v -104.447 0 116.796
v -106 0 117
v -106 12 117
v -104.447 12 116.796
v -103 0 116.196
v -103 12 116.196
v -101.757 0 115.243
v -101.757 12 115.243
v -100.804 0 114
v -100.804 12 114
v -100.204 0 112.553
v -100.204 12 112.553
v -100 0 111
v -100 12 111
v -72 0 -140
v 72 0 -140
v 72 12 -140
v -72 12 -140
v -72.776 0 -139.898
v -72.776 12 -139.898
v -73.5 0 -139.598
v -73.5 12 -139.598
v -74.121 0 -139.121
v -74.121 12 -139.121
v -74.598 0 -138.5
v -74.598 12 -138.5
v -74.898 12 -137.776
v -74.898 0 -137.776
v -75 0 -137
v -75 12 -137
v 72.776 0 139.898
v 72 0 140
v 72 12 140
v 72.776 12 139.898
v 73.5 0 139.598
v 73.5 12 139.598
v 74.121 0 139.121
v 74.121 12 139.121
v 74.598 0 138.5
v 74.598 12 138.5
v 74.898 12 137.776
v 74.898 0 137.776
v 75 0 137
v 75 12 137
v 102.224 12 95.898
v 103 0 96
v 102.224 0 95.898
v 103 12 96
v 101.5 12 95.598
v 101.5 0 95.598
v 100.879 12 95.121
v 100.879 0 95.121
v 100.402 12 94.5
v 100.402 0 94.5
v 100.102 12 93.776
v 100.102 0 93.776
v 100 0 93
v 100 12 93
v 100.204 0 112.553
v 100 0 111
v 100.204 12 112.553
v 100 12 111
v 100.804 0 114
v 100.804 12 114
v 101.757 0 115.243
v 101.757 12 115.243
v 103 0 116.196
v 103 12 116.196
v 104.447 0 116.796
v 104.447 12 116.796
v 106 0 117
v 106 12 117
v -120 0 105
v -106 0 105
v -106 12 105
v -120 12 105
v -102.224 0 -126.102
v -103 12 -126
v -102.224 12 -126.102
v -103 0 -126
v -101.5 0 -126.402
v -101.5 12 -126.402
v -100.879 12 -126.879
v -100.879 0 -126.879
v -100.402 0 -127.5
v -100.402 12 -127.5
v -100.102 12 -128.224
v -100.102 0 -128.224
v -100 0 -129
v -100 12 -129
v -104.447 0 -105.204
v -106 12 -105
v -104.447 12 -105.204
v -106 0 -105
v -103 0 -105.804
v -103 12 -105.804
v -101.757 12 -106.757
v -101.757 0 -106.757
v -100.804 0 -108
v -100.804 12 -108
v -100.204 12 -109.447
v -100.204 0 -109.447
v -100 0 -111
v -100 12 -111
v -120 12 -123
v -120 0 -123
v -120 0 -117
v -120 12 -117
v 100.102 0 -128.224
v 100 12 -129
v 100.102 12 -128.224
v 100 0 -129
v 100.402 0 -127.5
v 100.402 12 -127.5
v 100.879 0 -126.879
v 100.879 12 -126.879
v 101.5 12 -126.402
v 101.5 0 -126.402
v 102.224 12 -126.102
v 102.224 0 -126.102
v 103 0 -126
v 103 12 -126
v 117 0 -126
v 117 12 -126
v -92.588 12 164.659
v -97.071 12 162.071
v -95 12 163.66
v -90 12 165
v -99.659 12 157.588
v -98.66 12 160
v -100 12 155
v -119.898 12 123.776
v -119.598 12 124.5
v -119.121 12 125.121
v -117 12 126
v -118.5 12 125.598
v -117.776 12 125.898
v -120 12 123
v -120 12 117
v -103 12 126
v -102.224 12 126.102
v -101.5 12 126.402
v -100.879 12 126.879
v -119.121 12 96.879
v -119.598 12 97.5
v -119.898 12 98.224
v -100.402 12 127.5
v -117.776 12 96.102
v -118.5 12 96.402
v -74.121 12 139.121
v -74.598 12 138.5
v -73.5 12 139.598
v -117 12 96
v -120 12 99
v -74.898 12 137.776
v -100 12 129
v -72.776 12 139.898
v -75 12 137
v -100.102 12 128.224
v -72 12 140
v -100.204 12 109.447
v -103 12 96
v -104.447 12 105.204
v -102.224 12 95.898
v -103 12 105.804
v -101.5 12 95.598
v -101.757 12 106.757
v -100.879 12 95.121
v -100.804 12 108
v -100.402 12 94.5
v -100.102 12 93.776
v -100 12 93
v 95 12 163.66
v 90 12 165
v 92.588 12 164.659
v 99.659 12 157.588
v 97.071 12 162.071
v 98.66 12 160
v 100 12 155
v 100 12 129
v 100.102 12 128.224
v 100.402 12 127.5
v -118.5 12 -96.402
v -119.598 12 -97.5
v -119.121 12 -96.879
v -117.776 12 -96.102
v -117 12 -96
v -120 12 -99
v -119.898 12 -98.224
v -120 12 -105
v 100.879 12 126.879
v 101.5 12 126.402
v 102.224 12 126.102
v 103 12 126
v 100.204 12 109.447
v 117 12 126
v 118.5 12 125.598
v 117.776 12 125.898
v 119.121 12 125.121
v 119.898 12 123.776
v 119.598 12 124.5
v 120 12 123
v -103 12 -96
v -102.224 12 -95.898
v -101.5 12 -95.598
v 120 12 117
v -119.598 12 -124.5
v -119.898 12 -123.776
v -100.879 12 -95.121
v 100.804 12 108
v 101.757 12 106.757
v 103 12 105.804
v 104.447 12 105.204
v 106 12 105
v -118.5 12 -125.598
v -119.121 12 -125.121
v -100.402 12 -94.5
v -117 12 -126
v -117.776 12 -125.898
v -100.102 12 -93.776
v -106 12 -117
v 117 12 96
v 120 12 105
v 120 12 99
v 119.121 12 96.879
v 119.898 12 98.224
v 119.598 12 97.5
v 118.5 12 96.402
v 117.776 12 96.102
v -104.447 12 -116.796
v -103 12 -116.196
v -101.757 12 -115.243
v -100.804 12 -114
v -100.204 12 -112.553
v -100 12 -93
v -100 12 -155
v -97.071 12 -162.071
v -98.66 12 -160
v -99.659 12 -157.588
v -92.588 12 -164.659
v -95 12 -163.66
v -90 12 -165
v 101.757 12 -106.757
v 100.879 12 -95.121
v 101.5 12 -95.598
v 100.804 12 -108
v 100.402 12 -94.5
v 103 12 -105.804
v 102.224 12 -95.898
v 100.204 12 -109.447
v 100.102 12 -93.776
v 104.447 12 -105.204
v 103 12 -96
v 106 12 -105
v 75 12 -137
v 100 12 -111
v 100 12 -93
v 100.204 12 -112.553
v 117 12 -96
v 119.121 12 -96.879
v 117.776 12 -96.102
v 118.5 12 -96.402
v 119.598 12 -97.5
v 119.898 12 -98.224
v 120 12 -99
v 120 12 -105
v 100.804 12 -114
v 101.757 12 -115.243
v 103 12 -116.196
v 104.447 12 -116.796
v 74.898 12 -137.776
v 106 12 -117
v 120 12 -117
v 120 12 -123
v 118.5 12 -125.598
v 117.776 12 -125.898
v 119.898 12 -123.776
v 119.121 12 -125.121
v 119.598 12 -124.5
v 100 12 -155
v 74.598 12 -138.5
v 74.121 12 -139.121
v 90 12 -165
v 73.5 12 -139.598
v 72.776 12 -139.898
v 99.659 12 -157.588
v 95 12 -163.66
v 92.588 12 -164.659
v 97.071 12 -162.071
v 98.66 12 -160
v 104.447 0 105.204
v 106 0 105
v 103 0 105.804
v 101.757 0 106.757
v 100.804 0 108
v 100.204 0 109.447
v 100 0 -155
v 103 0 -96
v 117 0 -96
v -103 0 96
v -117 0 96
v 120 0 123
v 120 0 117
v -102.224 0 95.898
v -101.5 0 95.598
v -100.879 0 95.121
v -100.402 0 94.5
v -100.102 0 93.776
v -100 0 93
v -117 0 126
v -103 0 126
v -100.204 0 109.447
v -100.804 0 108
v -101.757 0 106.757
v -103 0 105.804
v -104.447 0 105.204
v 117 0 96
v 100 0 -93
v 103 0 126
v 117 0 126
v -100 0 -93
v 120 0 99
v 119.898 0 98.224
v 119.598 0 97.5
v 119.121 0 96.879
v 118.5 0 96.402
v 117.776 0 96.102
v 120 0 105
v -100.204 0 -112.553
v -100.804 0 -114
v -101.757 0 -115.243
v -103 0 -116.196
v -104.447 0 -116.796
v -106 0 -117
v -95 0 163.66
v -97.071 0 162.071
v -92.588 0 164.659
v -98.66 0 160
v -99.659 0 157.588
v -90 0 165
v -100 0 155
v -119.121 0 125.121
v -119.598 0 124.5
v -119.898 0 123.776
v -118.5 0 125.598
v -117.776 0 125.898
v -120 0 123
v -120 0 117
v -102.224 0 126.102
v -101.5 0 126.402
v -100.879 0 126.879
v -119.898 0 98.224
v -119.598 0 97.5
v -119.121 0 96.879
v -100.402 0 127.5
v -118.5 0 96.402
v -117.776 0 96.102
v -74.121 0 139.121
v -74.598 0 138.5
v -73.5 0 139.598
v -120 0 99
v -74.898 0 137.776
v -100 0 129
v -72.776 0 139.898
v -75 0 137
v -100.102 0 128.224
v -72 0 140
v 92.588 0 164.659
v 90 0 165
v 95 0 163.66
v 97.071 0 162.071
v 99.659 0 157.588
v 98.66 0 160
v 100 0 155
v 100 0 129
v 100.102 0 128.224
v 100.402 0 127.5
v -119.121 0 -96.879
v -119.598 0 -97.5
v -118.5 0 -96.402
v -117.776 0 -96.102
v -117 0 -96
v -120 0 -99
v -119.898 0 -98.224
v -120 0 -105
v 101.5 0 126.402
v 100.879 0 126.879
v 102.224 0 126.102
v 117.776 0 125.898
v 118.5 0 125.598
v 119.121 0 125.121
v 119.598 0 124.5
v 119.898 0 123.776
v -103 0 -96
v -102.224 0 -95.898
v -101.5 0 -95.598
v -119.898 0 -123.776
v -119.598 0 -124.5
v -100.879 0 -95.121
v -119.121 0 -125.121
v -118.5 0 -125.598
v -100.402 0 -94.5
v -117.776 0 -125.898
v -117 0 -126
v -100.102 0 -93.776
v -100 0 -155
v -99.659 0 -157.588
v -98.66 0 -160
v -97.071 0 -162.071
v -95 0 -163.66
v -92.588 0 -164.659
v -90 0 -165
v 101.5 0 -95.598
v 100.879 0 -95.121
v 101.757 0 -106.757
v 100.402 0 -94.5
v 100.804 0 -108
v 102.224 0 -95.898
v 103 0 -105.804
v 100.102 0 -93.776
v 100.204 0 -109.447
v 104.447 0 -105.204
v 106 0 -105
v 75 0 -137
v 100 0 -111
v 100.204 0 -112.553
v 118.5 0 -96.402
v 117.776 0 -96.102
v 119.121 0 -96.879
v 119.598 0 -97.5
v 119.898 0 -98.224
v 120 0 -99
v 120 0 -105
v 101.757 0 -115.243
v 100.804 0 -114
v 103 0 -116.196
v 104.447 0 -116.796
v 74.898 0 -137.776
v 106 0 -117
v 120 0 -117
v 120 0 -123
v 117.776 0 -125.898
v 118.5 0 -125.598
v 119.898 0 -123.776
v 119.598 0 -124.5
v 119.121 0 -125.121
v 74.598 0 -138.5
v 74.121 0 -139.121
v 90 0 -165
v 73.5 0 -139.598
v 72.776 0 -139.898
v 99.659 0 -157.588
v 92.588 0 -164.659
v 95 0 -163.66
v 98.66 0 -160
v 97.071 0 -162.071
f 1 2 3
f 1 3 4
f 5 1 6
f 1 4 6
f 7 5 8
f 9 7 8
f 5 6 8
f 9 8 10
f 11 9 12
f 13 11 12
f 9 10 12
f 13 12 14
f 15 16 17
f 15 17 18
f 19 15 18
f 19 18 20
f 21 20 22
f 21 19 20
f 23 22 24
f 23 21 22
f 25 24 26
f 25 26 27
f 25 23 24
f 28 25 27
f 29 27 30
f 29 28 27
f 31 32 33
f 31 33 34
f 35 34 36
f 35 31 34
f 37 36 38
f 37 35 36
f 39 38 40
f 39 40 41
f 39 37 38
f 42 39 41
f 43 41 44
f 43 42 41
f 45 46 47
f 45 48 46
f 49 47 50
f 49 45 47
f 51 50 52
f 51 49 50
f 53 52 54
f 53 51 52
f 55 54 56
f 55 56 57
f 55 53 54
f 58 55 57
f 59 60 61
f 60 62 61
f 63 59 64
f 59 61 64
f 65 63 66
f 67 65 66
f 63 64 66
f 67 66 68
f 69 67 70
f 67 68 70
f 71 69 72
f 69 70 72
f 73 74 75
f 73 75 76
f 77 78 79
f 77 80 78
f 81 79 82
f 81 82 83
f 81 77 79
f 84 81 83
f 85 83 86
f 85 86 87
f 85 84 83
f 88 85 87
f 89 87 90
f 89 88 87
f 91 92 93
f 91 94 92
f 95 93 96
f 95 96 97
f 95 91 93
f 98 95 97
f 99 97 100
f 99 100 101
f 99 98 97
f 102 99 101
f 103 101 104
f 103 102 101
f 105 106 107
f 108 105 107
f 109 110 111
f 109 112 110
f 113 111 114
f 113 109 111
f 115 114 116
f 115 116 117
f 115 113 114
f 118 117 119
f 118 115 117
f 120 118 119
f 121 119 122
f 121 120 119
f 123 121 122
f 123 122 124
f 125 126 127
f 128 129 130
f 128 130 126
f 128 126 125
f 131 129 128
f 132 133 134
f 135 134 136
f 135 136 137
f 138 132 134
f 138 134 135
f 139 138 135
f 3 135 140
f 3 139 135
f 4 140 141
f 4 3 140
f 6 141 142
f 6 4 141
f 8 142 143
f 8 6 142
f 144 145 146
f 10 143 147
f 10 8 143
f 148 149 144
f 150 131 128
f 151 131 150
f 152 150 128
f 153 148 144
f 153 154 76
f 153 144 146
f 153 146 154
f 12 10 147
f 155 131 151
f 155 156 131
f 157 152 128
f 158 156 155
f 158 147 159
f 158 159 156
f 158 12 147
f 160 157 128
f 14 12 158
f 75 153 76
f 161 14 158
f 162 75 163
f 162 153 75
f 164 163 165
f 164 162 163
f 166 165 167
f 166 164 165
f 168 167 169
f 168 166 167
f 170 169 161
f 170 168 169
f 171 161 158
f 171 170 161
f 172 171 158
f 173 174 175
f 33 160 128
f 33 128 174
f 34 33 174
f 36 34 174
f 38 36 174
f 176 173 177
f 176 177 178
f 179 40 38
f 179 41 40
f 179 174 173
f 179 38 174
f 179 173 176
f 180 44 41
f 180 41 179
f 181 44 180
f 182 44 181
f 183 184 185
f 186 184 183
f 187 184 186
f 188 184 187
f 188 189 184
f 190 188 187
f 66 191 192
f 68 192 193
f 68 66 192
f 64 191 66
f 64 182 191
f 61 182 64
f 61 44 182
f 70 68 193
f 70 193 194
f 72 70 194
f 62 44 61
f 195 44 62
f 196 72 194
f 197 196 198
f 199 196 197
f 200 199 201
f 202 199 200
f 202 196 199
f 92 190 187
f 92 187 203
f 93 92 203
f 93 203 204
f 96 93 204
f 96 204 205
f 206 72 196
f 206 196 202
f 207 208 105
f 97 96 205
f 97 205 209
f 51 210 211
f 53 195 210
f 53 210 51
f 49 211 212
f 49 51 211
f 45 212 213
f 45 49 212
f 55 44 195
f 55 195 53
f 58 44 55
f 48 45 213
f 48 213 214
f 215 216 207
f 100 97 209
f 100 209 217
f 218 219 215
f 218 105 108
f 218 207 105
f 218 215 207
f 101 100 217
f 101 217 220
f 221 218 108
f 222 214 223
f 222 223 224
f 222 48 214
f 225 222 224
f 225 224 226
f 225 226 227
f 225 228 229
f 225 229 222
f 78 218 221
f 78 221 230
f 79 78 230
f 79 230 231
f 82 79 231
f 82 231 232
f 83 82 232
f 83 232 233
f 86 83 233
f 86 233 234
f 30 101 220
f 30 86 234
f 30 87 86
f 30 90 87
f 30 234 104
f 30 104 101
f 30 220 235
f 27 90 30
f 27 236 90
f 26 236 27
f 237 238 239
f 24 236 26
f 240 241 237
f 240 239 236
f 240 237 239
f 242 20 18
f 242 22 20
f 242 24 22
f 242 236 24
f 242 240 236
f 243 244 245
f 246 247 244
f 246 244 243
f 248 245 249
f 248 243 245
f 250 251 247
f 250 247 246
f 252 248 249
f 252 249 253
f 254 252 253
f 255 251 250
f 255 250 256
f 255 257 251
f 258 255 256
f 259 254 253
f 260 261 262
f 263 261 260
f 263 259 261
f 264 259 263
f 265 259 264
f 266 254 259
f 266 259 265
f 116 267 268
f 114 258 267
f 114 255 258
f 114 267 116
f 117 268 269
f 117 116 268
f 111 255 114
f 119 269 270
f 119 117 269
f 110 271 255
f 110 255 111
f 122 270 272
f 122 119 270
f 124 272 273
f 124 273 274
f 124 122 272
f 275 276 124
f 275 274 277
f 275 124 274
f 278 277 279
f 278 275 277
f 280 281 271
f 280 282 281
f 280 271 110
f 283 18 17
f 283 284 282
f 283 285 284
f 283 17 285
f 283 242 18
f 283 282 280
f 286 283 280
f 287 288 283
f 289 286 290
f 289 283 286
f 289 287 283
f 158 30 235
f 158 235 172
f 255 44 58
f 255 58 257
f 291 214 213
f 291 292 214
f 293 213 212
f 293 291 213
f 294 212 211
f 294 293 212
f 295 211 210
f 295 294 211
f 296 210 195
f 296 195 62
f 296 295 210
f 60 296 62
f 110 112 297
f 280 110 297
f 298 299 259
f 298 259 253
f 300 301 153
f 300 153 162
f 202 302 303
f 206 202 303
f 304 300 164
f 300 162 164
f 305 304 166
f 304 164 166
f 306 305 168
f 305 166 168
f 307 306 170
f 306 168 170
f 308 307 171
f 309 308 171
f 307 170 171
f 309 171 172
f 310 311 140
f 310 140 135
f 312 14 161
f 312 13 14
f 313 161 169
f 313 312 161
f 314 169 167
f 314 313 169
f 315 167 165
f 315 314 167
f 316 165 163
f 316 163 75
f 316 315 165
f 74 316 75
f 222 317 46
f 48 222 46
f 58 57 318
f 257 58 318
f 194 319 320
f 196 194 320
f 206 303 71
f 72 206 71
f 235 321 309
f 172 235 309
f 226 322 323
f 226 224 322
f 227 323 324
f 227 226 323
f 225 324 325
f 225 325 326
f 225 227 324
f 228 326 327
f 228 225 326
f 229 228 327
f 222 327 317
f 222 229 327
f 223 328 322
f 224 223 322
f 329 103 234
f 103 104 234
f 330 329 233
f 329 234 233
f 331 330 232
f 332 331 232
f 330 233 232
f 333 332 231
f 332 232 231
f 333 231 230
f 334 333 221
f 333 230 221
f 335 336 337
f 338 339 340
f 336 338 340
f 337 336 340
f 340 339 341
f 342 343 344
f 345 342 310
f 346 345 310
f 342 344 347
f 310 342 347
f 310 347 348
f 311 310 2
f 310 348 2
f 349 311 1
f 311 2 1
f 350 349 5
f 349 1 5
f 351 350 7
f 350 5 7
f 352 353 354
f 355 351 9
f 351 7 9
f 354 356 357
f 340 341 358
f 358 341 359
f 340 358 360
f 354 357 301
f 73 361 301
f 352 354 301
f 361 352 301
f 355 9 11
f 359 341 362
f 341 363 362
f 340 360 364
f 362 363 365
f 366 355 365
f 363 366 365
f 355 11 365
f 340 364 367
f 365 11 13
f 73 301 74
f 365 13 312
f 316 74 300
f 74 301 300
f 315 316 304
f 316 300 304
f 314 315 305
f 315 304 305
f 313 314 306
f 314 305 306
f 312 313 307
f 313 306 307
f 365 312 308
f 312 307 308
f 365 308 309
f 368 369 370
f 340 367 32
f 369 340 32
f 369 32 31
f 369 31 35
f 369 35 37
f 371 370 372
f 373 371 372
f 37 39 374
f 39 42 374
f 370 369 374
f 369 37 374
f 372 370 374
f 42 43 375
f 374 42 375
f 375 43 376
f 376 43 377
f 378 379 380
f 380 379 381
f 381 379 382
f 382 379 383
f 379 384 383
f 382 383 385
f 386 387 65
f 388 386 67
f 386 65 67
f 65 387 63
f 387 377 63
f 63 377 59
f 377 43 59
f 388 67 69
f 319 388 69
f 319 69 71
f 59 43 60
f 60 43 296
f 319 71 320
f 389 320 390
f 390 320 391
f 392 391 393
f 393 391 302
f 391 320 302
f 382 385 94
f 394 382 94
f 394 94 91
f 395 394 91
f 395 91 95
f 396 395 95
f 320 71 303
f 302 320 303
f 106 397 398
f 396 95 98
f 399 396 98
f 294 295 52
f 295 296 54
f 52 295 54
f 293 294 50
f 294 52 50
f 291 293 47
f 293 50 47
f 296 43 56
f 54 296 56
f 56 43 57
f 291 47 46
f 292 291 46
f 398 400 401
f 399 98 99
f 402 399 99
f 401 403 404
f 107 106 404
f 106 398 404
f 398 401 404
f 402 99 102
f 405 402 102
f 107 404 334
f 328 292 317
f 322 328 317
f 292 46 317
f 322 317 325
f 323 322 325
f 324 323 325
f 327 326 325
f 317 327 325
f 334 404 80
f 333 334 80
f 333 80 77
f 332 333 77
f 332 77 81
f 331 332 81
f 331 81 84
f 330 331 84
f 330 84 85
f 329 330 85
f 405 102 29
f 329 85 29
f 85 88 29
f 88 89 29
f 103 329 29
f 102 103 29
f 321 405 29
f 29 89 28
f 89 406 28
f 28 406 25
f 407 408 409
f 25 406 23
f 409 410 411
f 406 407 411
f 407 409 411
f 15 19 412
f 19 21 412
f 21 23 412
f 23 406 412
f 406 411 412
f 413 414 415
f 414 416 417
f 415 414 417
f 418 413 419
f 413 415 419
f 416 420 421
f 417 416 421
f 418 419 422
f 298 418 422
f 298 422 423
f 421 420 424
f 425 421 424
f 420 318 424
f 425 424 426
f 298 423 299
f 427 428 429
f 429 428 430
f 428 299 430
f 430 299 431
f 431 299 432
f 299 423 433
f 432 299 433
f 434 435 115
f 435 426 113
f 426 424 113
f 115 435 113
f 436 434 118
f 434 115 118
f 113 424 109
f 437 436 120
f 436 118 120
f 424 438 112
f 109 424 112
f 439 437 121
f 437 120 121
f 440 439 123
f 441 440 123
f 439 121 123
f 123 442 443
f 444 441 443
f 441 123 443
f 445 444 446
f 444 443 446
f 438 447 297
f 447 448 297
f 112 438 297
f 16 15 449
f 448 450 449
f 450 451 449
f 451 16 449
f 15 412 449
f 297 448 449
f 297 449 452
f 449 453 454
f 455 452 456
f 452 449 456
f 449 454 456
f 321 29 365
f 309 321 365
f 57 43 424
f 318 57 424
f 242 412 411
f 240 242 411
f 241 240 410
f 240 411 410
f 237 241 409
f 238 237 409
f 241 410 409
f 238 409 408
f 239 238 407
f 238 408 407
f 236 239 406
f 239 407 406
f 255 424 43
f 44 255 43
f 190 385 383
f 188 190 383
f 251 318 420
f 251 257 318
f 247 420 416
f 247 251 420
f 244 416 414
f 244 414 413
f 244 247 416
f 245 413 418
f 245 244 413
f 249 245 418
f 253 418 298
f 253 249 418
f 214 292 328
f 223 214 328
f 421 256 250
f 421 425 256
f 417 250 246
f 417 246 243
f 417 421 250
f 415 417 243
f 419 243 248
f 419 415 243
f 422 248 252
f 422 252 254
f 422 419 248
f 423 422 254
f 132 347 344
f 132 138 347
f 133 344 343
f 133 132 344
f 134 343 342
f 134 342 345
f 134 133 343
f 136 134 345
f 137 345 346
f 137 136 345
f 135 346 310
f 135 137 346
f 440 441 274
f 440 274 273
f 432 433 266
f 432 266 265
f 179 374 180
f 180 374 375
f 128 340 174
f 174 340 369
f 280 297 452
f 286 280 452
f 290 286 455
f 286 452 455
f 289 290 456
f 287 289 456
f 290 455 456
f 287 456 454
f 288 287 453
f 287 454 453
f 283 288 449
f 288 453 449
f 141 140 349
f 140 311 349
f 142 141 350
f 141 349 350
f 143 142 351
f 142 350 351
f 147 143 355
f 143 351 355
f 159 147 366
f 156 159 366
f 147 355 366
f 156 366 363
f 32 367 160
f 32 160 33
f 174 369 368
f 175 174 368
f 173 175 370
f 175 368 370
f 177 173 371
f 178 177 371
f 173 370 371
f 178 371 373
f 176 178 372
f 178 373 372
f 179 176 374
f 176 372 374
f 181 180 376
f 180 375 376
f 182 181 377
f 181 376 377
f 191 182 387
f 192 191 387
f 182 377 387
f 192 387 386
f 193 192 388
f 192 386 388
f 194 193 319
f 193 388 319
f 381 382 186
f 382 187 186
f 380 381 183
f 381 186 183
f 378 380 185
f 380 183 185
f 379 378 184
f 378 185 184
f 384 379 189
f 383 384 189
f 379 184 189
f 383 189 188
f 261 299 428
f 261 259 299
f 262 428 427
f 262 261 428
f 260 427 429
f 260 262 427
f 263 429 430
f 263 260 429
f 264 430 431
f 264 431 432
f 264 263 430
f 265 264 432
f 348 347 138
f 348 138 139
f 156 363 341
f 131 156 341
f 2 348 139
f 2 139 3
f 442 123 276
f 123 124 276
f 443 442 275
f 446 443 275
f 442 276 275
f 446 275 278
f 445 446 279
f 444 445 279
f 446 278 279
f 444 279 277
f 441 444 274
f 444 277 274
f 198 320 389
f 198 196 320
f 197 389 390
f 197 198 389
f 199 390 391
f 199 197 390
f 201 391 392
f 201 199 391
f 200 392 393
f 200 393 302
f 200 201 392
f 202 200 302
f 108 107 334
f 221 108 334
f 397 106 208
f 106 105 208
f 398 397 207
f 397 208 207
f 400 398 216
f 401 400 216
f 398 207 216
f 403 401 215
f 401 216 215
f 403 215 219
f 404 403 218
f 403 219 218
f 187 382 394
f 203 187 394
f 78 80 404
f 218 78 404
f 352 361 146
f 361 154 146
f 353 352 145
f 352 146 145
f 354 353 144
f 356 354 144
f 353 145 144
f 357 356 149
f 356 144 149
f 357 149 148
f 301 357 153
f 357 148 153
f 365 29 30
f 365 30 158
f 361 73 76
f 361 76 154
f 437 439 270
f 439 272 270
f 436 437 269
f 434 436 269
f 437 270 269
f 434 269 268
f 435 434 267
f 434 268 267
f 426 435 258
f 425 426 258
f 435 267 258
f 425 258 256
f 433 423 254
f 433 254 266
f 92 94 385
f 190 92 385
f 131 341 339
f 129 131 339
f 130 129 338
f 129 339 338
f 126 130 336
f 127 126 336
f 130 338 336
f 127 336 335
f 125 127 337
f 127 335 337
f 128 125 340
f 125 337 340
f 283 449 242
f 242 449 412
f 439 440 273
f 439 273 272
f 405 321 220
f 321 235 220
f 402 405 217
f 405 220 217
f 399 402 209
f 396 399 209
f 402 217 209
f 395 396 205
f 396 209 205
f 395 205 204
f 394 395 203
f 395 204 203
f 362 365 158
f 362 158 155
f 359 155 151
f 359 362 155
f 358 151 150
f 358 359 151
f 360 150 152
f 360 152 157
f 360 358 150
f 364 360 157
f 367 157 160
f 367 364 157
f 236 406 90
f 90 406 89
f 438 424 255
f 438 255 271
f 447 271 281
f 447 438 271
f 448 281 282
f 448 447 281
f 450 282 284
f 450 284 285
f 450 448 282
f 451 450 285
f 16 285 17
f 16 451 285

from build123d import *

# Parameters (mm, degrees)
BOSS_EXTRUDE1_DEPTH  = 12
BOSS_EXTRUDE2_DEPTH  = 12
MIRROR4_COPY_1_DEPTH = 12
FILLET3_R            = 6
FILLET4_R            = 3


with BuildPart() as part:
    # Sketch2 → Boss-Extrude1 (new body)
    with BuildSketch(Plane(origin=(0, 0, 0), x_dir=(1, 0, 0), z_dir=(0, 1, 0))):
        with BuildLine():
            Line((-90, -165), (90, -165))
            ThreePointArc((90, -165), (97.071067812, -162.071067812), (100, -155))
            Line((100, -155), (100, 155))
            ThreePointArc((100, 155), (97.071067812, 162.071067812), (90, 165))
            Line((90, 165), (-90, 165))
            ThreePointArc((-90, 165), (-97.071067812, 162.071067812), (-100, 155))
            Line((-100, 155), (-100, -155))
            ThreePointArc((-100, -155), (-97.071067812, -162.071067812), (-90, -165))
        make_face()
        with BuildLine():
            Line((-72, -140), (72, -140))
            ThreePointArc((72, -140), (74.121320344, -139.121320344), (75, -137))
            Line((75, -137), (75, 137))
            ThreePointArc((75, 137), (74.121320344, 139.121320344), (72, 140))
            Line((72, 140), (-72, 140))
            ThreePointArc((-72, 140), (-74.121320344, 139.121320344), (-75, 137))
            Line((-75, 137), (-75, -137))
            ThreePointArc((-75, -137), (-74.121320344, -139.121320344), (-72, -140))
        make_face(mode=Mode.SUBTRACT)
    extrude(amount=BOSS_EXTRUDE1_DEPTH)

    # Sketch3 → Boss-Extrude2 (add)
    with BuildSketch(Plane(origin=(0, 0, 0), x_dir=(1, 0, 0), z_dir=(0, 1, 0))):
        Polygon((75, 126), (120, 126), (120, 117), (97, 117), (97, 105), (120, 105), (120, 96), (75, 96), align=None)
    boss_extrude2 = extrude(amount=BOSS_EXTRUDE2_DEPTH)

    # Mirror3: Boss-Extrude2 across plane
    add(boss_extrude2.mirror(Plane(origin=(0, 0, 0), x_dir=(0, 0, 1), z_dir=(1, 0, 0))))

    # Mirror4: Boss-Extrude2 across plane
    add(boss_extrude2.mirror(Plane.XY))

    # Mirror4 copy 1 sketch → Mirror4 copy 1 (add)
    with BuildSketch(Plane(origin=(0, 0, 0), x_dir=(-1, 0, 0), z_dir=(0, 1, 0))):
        Polygon((75, 126), (120, 126), (120, 117), (97, 117), (97, 105), (120, 105), (120, 96), (75, 96), align=None)
    extrude(amount=MIRROR4_COPY_1_DEPTH)

    # Fillet3
    fillet3_edges = [part.edges().sort_by_distance(p)[0] for p in [
        (-100, 6, 117),
        (-100, 6, 105),
        (100, 6, 117),
        (100, 6, 105),
        (100, 6, -105),
        (100, 6, -117),
        (-100, 6, -105),
        (-100, 6, -117),
    ]]
    fillet(fillet3_edges, radius=FILLET3_R - 0.0001)  # a hair under: the kernel refuses the full size

    # Fillet4
    fillet4_edges = [part.edges().sort_by_distance(p)[0] for p in [
        (-120, 6, -96),
        (-120, 6, -126),
        (-100, 6, -96),
        (-100, 6, -126),
        (120, 6, 96),
        (120, 6, 126),
        (100, 6, 96),
        (100, 6, 126),
        (-100, 6, 126),
        (-120, 6, 126),
        (-100, 6, 96),
        (-120, 6, 96),
        (100, 6, -126),
        (120, 6, -126),
        (100, 6, -96),
        (120, 6, -96),
    ]]
    fillet(fillet4_edges, radius=FILLET4_R)


solid = part.part
